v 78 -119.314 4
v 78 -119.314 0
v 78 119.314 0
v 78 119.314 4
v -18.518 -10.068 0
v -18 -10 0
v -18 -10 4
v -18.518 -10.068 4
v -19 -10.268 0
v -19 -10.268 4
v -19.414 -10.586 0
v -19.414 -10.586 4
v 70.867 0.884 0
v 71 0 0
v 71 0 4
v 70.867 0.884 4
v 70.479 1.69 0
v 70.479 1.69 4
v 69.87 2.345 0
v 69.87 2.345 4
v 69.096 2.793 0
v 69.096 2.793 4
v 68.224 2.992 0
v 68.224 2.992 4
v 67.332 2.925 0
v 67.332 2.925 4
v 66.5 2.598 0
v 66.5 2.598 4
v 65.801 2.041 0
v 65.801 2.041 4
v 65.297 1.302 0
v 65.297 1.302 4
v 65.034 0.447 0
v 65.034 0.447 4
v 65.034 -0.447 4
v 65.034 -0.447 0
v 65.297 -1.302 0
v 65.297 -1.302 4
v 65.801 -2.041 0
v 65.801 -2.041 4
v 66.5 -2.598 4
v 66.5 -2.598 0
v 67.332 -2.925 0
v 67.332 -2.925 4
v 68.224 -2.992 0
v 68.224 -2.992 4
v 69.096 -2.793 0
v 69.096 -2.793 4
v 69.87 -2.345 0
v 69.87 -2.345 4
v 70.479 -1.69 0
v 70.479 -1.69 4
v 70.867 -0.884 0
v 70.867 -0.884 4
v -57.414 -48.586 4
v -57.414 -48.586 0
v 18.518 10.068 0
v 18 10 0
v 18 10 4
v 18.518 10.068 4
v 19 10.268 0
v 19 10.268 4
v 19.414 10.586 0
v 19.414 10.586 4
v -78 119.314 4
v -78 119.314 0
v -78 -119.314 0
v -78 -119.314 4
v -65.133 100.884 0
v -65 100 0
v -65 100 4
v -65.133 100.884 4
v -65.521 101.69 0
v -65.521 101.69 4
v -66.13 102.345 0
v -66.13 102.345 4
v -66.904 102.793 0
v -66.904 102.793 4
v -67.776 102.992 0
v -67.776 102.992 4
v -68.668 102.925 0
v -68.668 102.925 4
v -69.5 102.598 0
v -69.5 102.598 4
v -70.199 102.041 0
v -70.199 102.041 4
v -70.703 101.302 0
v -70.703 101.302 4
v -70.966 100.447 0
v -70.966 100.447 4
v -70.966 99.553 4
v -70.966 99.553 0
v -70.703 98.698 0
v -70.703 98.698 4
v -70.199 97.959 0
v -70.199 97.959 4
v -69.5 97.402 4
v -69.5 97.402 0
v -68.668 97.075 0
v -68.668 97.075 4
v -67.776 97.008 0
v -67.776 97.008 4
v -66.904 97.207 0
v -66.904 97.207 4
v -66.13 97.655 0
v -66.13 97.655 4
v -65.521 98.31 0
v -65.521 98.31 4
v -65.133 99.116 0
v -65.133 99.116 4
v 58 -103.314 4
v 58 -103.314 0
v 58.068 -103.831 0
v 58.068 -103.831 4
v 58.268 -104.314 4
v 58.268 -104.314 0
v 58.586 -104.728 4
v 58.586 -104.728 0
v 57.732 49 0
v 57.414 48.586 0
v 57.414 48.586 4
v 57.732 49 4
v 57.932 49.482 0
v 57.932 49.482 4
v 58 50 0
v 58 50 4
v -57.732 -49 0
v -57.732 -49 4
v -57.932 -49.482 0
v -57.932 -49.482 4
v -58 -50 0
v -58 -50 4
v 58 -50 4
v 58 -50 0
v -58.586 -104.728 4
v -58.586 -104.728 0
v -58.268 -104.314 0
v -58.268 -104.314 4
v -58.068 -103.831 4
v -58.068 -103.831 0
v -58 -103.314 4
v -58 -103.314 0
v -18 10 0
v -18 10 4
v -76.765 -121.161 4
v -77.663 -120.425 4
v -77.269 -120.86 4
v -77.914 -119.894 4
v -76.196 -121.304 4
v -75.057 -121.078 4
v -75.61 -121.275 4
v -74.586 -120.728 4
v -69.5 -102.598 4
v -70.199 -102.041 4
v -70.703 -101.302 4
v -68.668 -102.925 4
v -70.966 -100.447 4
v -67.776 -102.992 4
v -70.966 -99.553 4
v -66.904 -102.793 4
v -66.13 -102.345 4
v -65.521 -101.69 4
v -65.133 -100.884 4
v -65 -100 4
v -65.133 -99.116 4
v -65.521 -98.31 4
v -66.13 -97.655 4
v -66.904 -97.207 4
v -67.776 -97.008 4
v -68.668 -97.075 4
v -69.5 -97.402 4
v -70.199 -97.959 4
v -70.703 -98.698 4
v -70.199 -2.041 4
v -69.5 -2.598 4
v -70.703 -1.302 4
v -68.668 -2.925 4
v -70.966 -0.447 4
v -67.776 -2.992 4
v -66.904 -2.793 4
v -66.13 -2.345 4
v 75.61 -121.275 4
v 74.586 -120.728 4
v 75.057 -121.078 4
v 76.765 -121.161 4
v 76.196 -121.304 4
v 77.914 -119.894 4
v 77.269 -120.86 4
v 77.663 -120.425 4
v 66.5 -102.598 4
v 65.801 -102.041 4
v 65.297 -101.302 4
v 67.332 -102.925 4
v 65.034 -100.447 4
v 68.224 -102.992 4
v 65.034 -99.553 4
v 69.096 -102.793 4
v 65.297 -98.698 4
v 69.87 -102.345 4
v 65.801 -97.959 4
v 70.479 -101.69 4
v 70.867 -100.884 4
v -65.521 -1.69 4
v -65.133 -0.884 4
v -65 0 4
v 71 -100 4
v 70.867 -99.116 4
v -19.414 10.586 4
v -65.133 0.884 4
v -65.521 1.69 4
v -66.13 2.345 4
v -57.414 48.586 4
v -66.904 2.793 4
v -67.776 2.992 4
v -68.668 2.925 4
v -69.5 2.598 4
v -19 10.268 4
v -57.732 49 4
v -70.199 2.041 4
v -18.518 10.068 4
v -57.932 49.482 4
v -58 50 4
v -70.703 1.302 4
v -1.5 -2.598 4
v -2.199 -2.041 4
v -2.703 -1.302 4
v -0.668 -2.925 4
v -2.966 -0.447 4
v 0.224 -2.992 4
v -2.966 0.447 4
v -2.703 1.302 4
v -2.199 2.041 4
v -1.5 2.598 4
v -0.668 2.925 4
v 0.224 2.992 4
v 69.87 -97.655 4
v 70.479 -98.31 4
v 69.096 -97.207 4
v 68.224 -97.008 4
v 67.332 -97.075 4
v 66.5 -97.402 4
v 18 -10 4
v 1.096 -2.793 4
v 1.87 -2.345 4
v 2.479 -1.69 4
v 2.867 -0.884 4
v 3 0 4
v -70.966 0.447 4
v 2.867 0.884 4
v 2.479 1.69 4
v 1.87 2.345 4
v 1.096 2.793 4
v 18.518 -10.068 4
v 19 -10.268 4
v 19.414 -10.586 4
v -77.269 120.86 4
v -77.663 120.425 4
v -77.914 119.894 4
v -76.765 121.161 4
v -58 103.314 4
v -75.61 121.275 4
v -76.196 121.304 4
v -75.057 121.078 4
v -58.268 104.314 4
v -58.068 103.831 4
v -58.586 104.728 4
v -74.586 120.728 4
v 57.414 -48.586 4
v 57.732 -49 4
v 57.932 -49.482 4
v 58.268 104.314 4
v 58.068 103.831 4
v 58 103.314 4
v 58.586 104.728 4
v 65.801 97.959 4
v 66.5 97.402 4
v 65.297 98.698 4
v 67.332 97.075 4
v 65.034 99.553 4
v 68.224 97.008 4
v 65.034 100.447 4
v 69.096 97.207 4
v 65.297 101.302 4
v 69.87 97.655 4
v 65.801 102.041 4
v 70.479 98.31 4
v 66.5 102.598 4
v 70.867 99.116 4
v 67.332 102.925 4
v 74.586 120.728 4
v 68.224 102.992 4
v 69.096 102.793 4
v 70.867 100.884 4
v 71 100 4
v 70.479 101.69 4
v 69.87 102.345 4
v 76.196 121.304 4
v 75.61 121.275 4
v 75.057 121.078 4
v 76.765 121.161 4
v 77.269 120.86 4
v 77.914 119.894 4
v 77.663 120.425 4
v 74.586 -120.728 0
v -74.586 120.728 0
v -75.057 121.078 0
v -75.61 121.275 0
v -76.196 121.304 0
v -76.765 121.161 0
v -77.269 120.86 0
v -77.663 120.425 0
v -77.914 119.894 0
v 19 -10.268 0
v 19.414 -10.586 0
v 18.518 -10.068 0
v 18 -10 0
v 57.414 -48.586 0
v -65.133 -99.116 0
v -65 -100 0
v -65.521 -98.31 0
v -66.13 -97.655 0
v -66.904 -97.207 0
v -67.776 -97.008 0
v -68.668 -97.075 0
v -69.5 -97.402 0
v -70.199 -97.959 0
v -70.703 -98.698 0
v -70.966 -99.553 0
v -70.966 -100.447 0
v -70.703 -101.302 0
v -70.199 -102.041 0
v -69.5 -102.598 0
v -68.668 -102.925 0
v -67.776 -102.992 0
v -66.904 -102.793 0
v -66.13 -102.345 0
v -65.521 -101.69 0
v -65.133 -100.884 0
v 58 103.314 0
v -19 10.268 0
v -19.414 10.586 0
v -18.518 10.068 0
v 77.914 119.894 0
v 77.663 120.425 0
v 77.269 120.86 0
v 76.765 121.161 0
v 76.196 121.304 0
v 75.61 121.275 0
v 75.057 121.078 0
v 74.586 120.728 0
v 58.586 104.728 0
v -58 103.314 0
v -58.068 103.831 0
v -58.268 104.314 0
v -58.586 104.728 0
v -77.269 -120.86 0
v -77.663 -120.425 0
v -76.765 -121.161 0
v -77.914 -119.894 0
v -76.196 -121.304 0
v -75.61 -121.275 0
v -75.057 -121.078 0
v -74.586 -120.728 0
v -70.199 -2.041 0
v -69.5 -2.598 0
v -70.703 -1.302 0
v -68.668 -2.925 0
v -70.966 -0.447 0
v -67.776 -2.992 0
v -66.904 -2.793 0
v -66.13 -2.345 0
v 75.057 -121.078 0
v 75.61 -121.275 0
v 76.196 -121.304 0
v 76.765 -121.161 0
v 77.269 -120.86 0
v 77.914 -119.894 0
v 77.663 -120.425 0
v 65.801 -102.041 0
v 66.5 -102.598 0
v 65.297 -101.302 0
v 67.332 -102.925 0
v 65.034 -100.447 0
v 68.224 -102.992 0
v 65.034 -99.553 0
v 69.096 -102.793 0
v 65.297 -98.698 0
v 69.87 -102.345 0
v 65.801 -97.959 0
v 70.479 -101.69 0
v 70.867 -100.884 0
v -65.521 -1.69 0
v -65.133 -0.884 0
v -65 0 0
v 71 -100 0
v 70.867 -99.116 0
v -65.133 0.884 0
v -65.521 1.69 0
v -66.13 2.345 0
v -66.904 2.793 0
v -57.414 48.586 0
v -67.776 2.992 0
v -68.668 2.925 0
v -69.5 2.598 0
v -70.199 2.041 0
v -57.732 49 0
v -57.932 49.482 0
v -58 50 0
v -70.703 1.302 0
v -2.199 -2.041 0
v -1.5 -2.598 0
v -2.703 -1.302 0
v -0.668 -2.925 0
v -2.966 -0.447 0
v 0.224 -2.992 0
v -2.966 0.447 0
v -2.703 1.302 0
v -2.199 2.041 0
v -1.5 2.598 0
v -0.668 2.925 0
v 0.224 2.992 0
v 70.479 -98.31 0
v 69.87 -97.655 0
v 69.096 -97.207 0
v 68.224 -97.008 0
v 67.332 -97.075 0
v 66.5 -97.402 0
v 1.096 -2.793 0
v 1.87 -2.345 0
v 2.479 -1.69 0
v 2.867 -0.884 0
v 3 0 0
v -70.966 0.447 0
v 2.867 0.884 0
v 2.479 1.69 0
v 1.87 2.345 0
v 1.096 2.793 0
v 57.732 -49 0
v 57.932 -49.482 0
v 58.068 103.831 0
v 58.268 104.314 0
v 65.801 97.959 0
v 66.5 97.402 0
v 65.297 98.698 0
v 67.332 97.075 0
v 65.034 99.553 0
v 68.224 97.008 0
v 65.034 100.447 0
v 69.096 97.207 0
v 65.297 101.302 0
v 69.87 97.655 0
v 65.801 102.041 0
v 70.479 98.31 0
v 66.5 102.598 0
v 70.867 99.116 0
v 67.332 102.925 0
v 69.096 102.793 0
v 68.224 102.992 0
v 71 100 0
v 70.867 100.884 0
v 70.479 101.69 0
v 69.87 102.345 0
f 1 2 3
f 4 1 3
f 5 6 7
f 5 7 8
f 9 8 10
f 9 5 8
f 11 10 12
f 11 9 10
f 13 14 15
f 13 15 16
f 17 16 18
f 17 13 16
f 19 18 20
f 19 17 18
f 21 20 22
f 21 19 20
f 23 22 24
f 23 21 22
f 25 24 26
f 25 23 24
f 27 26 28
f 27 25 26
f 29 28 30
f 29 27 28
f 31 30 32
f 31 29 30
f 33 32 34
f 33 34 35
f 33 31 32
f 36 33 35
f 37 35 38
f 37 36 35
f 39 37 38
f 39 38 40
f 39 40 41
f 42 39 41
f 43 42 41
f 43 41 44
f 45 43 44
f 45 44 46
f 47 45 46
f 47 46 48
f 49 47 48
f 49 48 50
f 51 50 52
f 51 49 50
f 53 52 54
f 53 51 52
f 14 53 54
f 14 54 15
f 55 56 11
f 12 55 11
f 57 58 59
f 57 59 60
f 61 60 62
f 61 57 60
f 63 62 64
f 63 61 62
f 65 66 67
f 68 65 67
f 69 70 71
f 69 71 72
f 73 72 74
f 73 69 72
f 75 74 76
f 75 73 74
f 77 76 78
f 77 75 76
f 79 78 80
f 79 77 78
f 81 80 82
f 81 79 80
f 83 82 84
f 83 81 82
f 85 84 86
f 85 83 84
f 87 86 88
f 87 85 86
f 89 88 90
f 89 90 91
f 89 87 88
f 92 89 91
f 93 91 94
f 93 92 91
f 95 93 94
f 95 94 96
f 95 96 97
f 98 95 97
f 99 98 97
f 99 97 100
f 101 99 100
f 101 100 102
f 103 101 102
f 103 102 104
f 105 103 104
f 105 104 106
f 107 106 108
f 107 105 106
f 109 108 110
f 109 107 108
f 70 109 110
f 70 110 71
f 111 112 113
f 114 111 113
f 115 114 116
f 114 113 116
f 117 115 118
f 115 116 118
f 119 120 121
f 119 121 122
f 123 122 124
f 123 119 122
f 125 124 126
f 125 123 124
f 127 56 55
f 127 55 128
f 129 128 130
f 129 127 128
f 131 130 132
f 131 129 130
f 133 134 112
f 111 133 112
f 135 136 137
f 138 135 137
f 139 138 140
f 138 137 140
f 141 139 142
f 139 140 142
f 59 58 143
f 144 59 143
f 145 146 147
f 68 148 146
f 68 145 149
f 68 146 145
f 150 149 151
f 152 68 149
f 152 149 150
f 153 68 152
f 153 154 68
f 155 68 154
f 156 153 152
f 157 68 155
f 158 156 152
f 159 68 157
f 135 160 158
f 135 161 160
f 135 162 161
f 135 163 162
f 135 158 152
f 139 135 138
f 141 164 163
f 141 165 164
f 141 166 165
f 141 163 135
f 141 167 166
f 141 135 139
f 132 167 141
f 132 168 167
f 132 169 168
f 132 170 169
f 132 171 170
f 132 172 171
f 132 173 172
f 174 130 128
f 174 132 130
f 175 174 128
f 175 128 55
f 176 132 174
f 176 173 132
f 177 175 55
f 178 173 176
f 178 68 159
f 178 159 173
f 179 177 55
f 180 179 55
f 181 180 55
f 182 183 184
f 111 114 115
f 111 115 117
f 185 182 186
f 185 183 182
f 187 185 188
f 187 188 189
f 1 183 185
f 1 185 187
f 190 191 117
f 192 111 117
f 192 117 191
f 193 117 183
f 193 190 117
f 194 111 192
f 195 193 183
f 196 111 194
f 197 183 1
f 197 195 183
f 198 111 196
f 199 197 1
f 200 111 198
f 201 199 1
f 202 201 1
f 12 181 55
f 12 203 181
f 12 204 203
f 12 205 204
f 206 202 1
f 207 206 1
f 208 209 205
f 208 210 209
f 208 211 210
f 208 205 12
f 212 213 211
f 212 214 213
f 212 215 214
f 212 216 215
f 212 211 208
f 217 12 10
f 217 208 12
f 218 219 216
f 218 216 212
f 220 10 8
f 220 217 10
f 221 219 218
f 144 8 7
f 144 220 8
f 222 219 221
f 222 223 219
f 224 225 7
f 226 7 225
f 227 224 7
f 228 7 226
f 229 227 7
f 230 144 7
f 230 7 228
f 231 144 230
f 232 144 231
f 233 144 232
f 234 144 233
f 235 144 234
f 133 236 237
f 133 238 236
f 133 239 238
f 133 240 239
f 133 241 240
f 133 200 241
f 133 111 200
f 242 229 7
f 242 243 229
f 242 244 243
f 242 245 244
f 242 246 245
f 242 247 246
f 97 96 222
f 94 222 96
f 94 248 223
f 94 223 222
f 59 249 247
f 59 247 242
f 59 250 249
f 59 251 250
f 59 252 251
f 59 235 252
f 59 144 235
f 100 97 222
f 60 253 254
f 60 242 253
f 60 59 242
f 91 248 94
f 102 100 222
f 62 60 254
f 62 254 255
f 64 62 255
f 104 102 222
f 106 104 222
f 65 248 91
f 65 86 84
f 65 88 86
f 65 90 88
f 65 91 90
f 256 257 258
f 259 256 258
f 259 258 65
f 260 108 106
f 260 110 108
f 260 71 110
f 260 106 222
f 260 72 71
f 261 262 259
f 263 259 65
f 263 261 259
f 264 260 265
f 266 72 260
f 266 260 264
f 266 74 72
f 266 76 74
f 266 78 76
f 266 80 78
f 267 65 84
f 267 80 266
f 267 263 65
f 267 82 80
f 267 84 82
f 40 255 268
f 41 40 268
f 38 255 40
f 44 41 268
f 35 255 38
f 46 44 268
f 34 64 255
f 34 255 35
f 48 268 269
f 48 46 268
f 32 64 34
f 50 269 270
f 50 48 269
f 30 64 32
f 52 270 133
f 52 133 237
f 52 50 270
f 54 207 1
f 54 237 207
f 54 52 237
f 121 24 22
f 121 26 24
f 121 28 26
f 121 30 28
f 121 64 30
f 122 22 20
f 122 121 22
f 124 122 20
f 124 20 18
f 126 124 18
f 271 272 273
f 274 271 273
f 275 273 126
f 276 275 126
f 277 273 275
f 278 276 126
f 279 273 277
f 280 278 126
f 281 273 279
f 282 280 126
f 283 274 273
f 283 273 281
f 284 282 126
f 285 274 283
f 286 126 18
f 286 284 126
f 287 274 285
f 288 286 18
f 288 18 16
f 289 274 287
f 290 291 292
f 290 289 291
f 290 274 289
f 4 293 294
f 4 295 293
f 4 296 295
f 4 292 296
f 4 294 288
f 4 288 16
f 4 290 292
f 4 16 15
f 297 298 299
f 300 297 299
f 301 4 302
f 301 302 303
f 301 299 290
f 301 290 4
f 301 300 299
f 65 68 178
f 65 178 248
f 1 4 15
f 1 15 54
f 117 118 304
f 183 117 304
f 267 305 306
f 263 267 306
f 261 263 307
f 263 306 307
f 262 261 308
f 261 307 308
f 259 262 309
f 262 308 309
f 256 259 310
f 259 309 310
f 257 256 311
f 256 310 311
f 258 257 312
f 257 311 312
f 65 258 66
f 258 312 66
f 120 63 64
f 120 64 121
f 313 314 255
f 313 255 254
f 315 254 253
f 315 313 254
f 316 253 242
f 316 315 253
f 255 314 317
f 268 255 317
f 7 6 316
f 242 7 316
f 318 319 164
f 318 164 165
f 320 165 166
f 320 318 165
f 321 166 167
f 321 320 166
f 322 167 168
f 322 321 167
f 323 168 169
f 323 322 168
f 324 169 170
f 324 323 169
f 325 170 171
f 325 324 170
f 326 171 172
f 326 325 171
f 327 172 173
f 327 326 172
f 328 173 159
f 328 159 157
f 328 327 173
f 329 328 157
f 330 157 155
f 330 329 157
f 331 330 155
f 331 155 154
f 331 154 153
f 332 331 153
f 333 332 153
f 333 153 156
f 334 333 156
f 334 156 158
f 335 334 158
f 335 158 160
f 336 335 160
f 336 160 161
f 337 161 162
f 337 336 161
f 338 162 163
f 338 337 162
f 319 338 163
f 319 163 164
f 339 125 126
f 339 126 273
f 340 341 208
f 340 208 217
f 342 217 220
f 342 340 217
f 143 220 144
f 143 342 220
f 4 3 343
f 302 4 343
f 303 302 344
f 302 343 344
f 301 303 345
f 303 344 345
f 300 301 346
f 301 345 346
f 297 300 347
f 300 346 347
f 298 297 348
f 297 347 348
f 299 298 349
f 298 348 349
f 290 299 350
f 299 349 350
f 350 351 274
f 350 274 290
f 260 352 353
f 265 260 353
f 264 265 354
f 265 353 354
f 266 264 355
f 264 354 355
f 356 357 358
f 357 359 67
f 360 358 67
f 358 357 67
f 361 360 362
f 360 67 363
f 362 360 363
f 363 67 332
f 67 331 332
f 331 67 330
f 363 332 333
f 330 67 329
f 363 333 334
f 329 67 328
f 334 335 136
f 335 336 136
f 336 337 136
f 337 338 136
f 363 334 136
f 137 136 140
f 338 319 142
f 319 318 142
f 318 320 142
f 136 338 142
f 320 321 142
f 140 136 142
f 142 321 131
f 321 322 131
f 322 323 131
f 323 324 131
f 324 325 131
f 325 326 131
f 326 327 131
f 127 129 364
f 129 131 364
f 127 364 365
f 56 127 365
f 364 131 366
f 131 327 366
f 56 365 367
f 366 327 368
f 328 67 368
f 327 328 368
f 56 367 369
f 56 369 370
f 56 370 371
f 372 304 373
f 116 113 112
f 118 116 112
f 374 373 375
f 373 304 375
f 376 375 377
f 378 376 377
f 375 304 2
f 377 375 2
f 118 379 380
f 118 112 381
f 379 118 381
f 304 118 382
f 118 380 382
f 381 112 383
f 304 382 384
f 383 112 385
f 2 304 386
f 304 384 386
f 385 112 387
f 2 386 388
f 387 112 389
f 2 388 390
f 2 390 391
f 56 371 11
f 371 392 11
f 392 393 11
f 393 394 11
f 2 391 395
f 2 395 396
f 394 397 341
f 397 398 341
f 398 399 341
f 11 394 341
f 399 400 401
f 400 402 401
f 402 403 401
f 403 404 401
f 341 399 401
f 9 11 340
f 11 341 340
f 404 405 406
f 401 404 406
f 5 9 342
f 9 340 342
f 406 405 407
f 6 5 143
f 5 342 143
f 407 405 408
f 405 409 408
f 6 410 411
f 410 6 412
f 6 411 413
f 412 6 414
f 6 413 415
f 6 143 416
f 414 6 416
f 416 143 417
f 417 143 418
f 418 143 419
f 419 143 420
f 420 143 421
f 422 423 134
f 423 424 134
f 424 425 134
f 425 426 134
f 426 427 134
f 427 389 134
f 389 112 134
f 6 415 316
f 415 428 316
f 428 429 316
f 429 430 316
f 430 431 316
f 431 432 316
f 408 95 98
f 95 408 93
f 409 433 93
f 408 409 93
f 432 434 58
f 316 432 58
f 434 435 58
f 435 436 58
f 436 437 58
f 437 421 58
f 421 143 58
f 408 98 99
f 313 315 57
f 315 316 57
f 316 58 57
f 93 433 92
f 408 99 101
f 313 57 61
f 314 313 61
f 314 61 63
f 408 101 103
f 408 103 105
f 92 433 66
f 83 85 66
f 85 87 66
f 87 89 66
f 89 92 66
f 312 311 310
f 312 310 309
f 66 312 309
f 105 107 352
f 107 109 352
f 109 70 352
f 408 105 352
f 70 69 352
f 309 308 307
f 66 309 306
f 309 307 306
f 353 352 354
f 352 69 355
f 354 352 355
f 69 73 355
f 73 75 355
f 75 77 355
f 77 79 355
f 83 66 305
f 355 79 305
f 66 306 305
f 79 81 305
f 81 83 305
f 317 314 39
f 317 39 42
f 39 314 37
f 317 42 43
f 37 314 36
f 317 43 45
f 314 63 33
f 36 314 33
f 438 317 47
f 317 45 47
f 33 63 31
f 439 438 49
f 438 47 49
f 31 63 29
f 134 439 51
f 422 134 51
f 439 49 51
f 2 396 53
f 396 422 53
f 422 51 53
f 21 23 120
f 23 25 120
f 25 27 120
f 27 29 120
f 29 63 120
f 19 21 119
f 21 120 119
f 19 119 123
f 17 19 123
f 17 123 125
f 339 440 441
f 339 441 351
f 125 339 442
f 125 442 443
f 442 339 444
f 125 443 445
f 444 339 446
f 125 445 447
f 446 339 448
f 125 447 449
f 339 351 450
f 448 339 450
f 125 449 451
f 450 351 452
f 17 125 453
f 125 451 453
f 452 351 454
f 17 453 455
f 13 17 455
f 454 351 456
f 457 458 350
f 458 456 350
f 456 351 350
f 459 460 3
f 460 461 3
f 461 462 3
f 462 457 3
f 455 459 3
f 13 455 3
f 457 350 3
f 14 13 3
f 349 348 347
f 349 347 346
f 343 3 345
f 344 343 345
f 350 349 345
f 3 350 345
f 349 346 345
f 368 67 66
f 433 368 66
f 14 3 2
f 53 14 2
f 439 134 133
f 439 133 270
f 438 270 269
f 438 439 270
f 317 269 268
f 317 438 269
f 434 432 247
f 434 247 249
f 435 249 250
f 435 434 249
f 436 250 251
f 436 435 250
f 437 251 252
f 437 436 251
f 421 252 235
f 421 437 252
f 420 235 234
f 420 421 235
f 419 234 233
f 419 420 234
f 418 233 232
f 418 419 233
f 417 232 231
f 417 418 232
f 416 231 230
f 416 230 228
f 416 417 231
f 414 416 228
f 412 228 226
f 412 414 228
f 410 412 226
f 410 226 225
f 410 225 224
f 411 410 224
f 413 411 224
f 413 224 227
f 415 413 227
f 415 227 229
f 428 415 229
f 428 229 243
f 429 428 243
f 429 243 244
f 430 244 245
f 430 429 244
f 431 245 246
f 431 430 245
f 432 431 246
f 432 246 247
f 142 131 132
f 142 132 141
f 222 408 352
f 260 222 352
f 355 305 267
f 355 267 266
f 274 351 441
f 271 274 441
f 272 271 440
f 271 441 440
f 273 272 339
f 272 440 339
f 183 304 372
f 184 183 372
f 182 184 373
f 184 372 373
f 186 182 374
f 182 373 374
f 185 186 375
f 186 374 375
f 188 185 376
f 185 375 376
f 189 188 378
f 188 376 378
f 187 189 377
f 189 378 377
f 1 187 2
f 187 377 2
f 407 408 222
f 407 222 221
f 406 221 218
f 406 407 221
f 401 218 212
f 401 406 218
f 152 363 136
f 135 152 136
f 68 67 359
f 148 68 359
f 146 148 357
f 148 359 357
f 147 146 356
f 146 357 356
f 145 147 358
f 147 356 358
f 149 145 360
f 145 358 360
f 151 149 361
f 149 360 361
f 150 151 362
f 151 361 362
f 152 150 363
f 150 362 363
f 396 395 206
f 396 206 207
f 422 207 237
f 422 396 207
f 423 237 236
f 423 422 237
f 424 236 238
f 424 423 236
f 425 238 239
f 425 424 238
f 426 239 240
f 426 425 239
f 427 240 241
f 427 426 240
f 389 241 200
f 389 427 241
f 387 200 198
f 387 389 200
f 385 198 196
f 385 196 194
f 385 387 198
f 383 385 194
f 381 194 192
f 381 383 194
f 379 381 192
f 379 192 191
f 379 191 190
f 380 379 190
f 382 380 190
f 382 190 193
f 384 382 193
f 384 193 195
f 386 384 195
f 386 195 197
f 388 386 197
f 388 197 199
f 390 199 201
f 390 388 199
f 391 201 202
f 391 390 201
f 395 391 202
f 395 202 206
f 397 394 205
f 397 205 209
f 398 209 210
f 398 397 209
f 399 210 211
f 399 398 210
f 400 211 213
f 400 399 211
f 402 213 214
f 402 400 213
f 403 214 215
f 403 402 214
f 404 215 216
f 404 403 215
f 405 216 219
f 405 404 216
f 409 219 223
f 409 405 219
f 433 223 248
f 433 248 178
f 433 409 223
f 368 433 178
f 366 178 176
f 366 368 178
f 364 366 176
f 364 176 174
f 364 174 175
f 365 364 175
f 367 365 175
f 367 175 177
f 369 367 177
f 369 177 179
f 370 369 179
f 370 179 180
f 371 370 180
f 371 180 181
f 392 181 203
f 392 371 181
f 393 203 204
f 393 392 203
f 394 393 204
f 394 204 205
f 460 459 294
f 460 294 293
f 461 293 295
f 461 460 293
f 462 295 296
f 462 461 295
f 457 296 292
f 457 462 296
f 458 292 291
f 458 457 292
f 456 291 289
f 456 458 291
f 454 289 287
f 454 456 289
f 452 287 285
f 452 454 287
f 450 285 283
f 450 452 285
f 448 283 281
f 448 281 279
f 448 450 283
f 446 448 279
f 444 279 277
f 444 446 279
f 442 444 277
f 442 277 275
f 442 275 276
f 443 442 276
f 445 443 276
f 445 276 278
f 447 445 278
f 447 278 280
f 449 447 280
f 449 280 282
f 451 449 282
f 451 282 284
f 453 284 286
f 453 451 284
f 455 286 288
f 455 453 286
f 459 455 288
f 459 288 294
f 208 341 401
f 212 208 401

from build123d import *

# Parameters (mm, degrees)
SKETCH_R  = 3
PAD_DEPTH = 4


with BuildPart() as part:
    # Sketch → Pad (new body)
    with BuildSketch(Plane.XY):
        with BuildLine():
            Line((-78, 119.313708), (-78, -119.313708))
            ThreePointArc((-78, -119.313708), (-76.765367, -121.161468), (-74.585786, -120.727922))
            Line((-74.585786, -120.727922), (-58.585786, -104.727922))
            ThreePointArc((-58.585786, -104.727922), (-58.152241, -104.079075), (-58, -103.313708))
            Line((-58, -50), (-58, -103.313708))
            ThreePointArc((-57.414214, -48.585786), (-57.847759, -49.234633), (-58, -50))
            Line((-57.414214, -48.585786), (-19.414214, -10.585786))
            ThreePointArc((-18, -10), (-18.765367, -10.152241), (-19.414214, -10.585786))
            Line((-18, -10), (18, -10))
            ThreePointArc((19.414214, -10.585786), (18.765367, -10.152241), (18, -10))
            Line((19.414214, -10.585786), (57.414214, -48.585786))
            ThreePointArc((58, -50), (57.847759, -49.234633), (57.414214, -48.585786))
            Line((58, -50), (58, -103.313708))
            ThreePointArc((58, -103.313708), (58.152241, -104.079075), (58.585786, -104.727922))
            Line((58.585786, -104.727922), (74.585786, -120.727922))
            ThreePointArc((74.585786, -120.727922), (76.765367, -121.161468), (78, -119.313708))
            Line((78, -119.313708), (78, 119.313708))
            ThreePointArc((78, 119.313708), (76.765367, 121.161468), (74.585786, 120.727922))
            Line((58.585786, 104.727922), (74.585786, 120.727922))
            ThreePointArc((58.585786, 104.727922), (58.152241, 104.079075), (58, 103.313708))
            Line((58, 50), (58, 103.313708))
            ThreePointArc((57.414214, 48.585786), (57.847759, 49.234633), (58, 50))
            Line((19.414214, 10.585786), (57.414214, 48.585786))
            ThreePointArc((18, 10), (18.765367, 10.152241), (19.414214, 10.585786))
            Line((18, 10), (-18, 10))
            ThreePointArc((-19.414214, 10.585786), (-18.765367, 10.152241), (-18, 10))
            Line((-19.414214, 10.585786), (-57.414214, 48.585786))
            ThreePointArc((-58, 50), (-57.847759, 49.234633), (-57.414214, 48.585786))
            Line((-58, 50), (-58, 103.313708))
            ThreePointArc((-58, 103.313708), (-58.152241, 104.079075), (-58.585786, 104.727922))
            Line((-74.585786, 120.727922), (-58.585786, 104.727922))
            ThreePointArc((-74.585786, 120.727922), (-76.765367, 121.161468), (-78, 119.313708))
        make_face()
        with Locations((-68, 0)):
            Circle(SKETCH_R, mode=Mode.SUBTRACT)
        with Locations((68, 0)):
            Circle(SKETCH_R, mode=Mode.SUBTRACT)
        with Locations((-68, -100)):
            Circle(SKETCH_R, mode=Mode.SUBTRACT)
        with Locations((68, -100)):
            Circle(SKETCH_R, mode=Mode.SUBTRACT)
        Circle(SKETCH_R, mode=Mode.SUBTRACT)
        with Locations((-68, 100)):
            Circle(SKETCH_R, mode=Mode.SUBTRACT)
        with Locations((68, 100)):
            Circle(SKETCH_R, mode=Mode.SUBTRACT)
    extrude(amount=PAD_DEPTH)


solid = part.part
